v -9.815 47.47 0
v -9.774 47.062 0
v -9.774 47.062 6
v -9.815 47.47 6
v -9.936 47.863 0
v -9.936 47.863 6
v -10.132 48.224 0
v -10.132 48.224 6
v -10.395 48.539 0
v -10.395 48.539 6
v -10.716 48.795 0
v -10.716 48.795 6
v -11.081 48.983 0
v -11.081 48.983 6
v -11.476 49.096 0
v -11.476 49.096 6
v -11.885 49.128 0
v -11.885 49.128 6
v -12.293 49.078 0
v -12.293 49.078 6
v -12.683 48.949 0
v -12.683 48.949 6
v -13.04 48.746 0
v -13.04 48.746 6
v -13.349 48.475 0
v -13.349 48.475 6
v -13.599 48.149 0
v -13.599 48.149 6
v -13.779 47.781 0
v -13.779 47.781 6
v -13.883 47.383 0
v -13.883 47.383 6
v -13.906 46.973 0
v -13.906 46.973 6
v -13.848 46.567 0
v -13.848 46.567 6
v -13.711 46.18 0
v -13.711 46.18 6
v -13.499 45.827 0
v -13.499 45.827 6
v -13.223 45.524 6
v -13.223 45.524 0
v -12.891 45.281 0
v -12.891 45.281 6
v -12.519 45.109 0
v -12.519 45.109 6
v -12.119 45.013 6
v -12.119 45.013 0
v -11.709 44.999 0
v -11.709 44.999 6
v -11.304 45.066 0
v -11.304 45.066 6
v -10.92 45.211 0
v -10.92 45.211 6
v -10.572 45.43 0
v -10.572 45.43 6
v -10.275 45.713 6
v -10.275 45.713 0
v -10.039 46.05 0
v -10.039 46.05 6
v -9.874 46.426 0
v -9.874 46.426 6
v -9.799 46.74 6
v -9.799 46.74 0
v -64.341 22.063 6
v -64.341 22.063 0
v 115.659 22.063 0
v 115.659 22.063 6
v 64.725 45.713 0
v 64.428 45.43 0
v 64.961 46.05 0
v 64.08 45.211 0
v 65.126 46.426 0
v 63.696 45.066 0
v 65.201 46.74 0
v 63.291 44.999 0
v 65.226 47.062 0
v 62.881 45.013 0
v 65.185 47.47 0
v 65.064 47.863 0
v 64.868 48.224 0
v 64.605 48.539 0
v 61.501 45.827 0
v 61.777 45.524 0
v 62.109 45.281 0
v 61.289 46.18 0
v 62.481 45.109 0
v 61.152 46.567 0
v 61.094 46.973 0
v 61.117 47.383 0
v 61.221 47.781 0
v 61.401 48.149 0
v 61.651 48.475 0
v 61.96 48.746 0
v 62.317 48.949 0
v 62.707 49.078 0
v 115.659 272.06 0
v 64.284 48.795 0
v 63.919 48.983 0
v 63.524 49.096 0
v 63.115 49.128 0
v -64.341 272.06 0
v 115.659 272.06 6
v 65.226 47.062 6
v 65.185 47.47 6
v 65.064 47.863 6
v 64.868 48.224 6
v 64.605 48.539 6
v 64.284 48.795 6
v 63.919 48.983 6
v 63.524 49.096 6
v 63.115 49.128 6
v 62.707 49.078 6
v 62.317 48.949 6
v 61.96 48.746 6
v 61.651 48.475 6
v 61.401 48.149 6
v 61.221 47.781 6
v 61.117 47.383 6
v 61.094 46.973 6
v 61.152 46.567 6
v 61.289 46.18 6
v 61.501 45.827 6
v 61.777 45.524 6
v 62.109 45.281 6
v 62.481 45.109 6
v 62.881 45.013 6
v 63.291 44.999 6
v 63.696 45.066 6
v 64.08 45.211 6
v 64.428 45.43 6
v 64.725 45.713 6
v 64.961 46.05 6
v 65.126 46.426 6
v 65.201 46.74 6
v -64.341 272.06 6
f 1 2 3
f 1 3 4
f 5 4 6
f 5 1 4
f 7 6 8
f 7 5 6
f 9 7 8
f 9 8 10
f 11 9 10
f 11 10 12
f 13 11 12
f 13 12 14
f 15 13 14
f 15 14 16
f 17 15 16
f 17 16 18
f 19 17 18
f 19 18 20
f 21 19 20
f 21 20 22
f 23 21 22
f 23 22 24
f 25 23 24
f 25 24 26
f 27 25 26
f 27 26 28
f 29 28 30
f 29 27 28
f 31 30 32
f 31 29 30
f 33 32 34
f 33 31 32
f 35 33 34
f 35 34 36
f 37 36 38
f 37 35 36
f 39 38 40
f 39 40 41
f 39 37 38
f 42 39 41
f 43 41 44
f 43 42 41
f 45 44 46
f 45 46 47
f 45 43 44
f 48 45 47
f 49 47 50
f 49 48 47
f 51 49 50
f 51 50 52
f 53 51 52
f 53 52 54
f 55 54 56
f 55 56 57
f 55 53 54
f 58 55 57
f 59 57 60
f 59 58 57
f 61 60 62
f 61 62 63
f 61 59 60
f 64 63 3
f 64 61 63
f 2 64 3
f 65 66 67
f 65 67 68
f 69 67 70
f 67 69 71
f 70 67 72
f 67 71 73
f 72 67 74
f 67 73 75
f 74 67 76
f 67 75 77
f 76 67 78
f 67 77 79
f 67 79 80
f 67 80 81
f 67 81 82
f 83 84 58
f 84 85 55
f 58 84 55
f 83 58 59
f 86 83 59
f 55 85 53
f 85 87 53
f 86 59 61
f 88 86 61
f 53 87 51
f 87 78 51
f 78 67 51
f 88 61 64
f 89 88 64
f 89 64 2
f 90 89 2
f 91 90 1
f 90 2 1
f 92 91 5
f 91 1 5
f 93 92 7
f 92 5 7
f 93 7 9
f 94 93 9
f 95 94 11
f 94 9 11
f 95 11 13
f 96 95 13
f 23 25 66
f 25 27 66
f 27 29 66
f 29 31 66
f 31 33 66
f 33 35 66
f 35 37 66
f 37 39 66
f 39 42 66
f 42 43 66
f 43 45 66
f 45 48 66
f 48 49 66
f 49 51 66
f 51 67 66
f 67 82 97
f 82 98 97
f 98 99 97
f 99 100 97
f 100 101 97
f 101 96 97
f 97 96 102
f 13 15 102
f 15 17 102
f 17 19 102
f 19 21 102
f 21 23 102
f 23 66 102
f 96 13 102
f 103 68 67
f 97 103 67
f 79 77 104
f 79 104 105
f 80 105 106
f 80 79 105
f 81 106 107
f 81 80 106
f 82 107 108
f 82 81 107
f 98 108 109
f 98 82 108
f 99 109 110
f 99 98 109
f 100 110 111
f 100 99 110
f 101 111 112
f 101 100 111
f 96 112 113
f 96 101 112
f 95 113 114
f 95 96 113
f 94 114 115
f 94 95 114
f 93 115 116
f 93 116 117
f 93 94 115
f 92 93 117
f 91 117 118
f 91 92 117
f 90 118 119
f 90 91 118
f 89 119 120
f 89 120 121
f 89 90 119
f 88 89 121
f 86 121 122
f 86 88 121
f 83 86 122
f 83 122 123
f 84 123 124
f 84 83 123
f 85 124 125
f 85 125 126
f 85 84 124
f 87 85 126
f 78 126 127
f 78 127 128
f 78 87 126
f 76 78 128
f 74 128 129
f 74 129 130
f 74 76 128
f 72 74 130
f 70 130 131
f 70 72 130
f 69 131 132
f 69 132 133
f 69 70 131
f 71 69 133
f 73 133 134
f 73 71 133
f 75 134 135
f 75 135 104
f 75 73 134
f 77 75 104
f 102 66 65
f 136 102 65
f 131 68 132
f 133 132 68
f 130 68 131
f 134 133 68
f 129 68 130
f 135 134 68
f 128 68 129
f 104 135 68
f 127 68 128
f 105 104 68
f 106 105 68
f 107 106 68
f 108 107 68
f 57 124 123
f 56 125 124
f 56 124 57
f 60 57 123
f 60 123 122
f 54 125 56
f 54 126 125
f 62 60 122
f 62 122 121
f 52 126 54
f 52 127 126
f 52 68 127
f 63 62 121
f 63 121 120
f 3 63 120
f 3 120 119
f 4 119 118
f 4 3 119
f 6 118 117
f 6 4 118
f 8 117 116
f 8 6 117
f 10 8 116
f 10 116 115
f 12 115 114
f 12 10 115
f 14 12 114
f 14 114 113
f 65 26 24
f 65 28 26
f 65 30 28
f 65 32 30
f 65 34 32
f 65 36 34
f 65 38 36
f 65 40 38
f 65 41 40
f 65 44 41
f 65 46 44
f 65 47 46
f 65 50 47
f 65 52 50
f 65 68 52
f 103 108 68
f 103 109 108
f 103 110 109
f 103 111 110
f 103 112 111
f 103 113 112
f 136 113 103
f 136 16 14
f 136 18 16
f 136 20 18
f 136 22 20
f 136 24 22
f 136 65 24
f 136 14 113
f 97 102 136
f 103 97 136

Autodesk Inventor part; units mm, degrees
ref_plane "YZ Plane" through (0, 0, 0) normal (1, 0, 0) x (0, 1, 0)
ref_plane "XZ Plane" through (0, 0, 0) normal (0, 1, 0) x (-1, 0, 0)
ref_plane "XY Plane" through (0, 0, 0) normal (0, 0, 1) x (1, 0, 0)
ref_plane "Work Plane1" through (0, 0, 0) normal (0, 0, 1) x (1, 0, 0)
sketch "Sketch1" plane through (0, 0, 0) normal (0, 0, 1) x (1, 0, 0)
  line L0 (105.6587, 72.0604) -> (105.6587, 22.0626) projected
  line L1 (-54.3413, 72.0604) -> (105.6587, 72.0604) projected
  line L2 (-54.3413, 22.0626) -> (-54.3413, 72.0604) projected
  line L3 (105.6587, 22.0626) -> (-54.3413, 22.0626) projected
  line L4 (105.6587, 72.0604) -> (105.6587, 272.0604)
  line L5 (105.6587, 272.0604) -> (-54.3413, 272.0604)
  line L6 (-54.3413, 272.0604) -> (-54.3413, 72.0604)
  line L7 (105.6587, 72.0604) -> (-54.3413, 72.0604)
  line L8 (-54.3413, 72.0604) -> (-54.3413, 22.0626)
  line L9 (105.6587, 22.0626) -> (105.6587, 72.0604)
  line L10 (105.6587, 22.0626) -> (-54.3413, 22.0626)
  ellipse E0 centre (-11.8413, 47.0615) end of major axis (-9.7743, 47.0615) minor radius 2.0669 projected
  ellipse E1 centre (63.1587, 47.0615) end of major axis (65.2257, 47.0615) minor radius 2.0669 projected
  ellipse E2 centre (63.1587, 47.0615) end of major axis (65.2257, 47.0615) minor radius 2.0669 projected
  ellipse E3 centre (-11.8413, 47.0615) end of major axis (-9.7743, 47.0615) minor radius 2.0669 projected
  ellipse E4 centre (-36.8413, 63.0608) end of major axis (-30.8413, 63.0608) minor radius 5.9997 projected
  ellipse E5 centre (88.1587, 63.0608) end of major axis (94.1587, 63.0608) minor radius 5.9997 projected
  point P0 (0, 0)
  point P1 (-46.7889, 82.041)
extrude "Extrusion1" add sketch "Sketch1" along normal blind 6 contours L0 L3 L2 L1 | L1 L6 L5 L4 | E4 | E5
sketch "Sketch2" plane through (-54.3413, 22.0626, 0) normal (-1, 0, 0) x (0, 0, 1)
  line L0 (0, 249.9978) -> (0, 0) projected
  line L1 (0, 0) -> (6, 0) projected
  line L2 (6, 249.9978) -> (6, 0) projected
  line L3 (0, 249.9978) -> (6, 249.9978) projected
  point P0 (0, -22.0626)
extrude "Extrusion2" add sketch "Sketch2" along normal blind 10
sketch "Sketch3" plane through (105.6587, 22.0626, 0) normal (1, 0, 0) x (0, 0, -1)
  line L0 (0, 0) -> (0, 249.9978) projected
  line L1 (0, 249.9978) -> (-6, 249.9978) projected
  line L2 (-6, 0) -> (-6, 249.9978) projected
  line L3 (0, 0) -> (-6, 0) projected
  point P0 (0, -22.0626)
extrude "Extrusion3" add sketch "Sketch3" along normal blind 10
properties part number "Z axis Back Plate" material "Aluminum 6061"
